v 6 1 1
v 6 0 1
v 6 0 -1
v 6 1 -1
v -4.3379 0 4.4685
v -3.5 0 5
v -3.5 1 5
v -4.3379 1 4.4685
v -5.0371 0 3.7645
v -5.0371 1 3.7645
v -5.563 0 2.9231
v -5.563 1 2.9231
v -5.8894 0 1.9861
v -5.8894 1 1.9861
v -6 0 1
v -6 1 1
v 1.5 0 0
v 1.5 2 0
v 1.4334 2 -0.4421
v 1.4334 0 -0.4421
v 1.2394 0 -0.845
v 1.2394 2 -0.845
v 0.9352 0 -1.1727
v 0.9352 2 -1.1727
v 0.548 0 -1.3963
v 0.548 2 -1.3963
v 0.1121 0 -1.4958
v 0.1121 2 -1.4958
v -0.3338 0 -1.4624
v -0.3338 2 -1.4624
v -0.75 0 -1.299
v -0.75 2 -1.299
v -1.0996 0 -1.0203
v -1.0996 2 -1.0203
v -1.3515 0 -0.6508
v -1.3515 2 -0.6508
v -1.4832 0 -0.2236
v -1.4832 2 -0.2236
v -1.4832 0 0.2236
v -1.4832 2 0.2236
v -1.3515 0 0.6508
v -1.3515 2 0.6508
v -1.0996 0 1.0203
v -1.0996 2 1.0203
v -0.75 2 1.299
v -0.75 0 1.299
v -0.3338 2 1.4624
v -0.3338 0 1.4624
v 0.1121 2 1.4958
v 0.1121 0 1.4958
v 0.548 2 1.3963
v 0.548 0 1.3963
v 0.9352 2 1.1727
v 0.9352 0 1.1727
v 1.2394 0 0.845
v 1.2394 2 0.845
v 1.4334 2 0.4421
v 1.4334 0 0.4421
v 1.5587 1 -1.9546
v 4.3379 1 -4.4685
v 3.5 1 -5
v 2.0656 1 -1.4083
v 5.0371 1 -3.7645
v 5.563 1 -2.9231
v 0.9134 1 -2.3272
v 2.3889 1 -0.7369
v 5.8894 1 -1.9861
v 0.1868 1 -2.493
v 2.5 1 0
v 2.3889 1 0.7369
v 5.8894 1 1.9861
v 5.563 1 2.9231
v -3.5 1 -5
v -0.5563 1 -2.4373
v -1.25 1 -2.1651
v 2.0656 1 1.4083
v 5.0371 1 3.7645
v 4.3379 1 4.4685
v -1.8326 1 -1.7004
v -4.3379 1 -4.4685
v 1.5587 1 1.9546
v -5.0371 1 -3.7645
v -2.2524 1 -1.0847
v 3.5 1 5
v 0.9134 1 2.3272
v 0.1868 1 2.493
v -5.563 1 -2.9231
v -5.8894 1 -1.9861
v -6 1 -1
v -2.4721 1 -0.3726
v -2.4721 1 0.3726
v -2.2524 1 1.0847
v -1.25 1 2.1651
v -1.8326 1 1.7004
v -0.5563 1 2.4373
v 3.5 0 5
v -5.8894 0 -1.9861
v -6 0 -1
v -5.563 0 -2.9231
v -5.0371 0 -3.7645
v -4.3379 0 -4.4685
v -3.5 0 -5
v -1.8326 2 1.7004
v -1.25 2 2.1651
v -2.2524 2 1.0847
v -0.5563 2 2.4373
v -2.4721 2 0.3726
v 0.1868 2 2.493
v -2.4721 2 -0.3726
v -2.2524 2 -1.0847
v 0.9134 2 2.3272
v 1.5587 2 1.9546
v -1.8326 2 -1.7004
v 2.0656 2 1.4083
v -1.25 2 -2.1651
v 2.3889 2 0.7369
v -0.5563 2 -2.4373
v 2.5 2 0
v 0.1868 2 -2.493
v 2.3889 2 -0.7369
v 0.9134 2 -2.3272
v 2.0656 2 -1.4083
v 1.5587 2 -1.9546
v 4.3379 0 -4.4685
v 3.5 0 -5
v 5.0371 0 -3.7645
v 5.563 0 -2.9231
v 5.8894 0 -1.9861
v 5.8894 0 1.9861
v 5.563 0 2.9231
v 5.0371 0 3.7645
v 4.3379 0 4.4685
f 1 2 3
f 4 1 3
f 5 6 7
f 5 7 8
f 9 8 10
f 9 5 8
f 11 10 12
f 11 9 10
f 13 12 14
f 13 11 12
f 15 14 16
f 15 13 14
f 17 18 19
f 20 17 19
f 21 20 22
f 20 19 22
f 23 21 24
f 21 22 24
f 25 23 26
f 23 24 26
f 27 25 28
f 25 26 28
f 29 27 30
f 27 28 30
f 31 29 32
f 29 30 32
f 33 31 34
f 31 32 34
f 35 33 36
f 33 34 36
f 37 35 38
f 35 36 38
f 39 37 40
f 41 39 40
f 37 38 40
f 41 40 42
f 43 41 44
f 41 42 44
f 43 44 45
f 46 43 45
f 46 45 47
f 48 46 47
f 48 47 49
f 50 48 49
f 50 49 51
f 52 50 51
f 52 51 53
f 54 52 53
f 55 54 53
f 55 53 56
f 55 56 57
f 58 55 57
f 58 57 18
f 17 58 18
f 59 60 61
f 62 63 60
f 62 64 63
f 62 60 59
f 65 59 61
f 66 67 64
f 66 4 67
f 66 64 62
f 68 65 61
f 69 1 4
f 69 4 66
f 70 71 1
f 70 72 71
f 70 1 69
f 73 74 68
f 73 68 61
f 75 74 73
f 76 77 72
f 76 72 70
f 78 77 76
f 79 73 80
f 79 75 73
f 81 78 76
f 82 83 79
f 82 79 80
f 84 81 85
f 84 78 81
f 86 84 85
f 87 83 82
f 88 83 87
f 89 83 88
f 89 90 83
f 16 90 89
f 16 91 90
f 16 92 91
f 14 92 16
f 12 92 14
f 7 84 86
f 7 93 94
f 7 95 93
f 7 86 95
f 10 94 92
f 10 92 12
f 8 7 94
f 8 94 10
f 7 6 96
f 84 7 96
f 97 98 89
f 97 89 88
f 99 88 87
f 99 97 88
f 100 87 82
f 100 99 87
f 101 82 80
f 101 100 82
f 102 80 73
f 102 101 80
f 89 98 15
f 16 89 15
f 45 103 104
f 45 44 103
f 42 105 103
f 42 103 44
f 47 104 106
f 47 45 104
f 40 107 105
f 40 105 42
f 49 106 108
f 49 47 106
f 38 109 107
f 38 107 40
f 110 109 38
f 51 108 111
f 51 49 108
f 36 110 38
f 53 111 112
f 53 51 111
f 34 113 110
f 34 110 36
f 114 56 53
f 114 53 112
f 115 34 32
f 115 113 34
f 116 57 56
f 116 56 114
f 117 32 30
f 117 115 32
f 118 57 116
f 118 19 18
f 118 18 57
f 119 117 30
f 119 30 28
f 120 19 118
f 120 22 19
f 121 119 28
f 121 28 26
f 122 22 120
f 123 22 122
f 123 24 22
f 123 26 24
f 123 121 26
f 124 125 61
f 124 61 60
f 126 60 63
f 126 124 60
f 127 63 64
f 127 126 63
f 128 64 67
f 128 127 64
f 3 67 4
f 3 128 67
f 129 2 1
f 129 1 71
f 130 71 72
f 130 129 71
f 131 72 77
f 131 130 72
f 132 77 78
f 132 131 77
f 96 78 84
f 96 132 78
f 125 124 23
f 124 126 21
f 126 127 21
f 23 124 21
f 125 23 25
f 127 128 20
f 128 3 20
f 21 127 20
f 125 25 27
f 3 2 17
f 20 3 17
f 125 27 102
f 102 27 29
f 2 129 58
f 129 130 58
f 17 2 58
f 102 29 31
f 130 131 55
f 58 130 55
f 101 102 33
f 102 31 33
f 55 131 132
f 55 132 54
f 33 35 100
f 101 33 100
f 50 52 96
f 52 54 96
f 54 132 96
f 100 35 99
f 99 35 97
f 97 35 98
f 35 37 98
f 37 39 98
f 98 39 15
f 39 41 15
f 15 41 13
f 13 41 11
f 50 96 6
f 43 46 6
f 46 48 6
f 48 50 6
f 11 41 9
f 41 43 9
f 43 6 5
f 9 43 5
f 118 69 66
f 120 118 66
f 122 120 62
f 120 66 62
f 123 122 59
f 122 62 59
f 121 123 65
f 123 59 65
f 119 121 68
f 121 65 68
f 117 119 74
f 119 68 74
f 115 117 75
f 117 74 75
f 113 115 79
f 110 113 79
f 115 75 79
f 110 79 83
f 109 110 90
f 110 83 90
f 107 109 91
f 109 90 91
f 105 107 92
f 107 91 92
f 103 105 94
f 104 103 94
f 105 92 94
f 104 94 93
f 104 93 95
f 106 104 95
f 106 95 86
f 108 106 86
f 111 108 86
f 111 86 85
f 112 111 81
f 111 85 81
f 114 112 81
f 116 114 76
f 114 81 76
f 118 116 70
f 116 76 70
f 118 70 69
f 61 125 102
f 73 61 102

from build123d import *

# Parameters (mm, degrees)
PAD001_DEPTH    = 1
SKETCH004_R     = 2.5
PAD002_DEPTH    = 1
SKETCH005_R     = 1.5
POCKET002_DEPTH = 2.001


with BuildPart() as part:
    # Sketch003 → Pad001 (new body)
    with BuildSketch(Plane.XZ):
        with BuildLine():
            Line((-3.5, 5), (3.5, 5))
            ThreePointArc((6, 1), (5.323593, 3.358495), (3.5, 5))
            Line((6, 1), (6, -1))
            ThreePointArc((3.5, -5), (5.323593, -3.358495), (6, -1))
            Line((3.5, -5), (-3.5, -5))
            ThreePointArc((-6, -1), (-5.323593, -3.358495), (-3.5, -5))
            Line((-6, -1), (-6, 1))
            ThreePointArc((-3.5, 5), (-5.323593, 3.358495), (-6, 1))
        make_face()
    extrude(amount=-PAD001_DEPTH)

    # Sketch004 (on Face10 of Pad001) → Pad002 (join)
    with BuildSketch(Plane(origin=(0, 1, 0), x_dir=(1, 0, 0), z_dir=(0, 1, 0))):
        Circle(SKETCH004_R)
    extrude(amount=PAD002_DEPTH)

    # Sketch005 (on Face12 of Pad002) → Pocket002 (cut, through all)
    with BuildSketch(Plane(origin=(0, 2, 0), x_dir=(1, 0, 0), z_dir=(0, 1, 0))):
        Circle(SKETCH005_R)
    extrude(amount=-POCKET002_DEPTH, mode=Mode.SUBTRACT)


solid = part.part
